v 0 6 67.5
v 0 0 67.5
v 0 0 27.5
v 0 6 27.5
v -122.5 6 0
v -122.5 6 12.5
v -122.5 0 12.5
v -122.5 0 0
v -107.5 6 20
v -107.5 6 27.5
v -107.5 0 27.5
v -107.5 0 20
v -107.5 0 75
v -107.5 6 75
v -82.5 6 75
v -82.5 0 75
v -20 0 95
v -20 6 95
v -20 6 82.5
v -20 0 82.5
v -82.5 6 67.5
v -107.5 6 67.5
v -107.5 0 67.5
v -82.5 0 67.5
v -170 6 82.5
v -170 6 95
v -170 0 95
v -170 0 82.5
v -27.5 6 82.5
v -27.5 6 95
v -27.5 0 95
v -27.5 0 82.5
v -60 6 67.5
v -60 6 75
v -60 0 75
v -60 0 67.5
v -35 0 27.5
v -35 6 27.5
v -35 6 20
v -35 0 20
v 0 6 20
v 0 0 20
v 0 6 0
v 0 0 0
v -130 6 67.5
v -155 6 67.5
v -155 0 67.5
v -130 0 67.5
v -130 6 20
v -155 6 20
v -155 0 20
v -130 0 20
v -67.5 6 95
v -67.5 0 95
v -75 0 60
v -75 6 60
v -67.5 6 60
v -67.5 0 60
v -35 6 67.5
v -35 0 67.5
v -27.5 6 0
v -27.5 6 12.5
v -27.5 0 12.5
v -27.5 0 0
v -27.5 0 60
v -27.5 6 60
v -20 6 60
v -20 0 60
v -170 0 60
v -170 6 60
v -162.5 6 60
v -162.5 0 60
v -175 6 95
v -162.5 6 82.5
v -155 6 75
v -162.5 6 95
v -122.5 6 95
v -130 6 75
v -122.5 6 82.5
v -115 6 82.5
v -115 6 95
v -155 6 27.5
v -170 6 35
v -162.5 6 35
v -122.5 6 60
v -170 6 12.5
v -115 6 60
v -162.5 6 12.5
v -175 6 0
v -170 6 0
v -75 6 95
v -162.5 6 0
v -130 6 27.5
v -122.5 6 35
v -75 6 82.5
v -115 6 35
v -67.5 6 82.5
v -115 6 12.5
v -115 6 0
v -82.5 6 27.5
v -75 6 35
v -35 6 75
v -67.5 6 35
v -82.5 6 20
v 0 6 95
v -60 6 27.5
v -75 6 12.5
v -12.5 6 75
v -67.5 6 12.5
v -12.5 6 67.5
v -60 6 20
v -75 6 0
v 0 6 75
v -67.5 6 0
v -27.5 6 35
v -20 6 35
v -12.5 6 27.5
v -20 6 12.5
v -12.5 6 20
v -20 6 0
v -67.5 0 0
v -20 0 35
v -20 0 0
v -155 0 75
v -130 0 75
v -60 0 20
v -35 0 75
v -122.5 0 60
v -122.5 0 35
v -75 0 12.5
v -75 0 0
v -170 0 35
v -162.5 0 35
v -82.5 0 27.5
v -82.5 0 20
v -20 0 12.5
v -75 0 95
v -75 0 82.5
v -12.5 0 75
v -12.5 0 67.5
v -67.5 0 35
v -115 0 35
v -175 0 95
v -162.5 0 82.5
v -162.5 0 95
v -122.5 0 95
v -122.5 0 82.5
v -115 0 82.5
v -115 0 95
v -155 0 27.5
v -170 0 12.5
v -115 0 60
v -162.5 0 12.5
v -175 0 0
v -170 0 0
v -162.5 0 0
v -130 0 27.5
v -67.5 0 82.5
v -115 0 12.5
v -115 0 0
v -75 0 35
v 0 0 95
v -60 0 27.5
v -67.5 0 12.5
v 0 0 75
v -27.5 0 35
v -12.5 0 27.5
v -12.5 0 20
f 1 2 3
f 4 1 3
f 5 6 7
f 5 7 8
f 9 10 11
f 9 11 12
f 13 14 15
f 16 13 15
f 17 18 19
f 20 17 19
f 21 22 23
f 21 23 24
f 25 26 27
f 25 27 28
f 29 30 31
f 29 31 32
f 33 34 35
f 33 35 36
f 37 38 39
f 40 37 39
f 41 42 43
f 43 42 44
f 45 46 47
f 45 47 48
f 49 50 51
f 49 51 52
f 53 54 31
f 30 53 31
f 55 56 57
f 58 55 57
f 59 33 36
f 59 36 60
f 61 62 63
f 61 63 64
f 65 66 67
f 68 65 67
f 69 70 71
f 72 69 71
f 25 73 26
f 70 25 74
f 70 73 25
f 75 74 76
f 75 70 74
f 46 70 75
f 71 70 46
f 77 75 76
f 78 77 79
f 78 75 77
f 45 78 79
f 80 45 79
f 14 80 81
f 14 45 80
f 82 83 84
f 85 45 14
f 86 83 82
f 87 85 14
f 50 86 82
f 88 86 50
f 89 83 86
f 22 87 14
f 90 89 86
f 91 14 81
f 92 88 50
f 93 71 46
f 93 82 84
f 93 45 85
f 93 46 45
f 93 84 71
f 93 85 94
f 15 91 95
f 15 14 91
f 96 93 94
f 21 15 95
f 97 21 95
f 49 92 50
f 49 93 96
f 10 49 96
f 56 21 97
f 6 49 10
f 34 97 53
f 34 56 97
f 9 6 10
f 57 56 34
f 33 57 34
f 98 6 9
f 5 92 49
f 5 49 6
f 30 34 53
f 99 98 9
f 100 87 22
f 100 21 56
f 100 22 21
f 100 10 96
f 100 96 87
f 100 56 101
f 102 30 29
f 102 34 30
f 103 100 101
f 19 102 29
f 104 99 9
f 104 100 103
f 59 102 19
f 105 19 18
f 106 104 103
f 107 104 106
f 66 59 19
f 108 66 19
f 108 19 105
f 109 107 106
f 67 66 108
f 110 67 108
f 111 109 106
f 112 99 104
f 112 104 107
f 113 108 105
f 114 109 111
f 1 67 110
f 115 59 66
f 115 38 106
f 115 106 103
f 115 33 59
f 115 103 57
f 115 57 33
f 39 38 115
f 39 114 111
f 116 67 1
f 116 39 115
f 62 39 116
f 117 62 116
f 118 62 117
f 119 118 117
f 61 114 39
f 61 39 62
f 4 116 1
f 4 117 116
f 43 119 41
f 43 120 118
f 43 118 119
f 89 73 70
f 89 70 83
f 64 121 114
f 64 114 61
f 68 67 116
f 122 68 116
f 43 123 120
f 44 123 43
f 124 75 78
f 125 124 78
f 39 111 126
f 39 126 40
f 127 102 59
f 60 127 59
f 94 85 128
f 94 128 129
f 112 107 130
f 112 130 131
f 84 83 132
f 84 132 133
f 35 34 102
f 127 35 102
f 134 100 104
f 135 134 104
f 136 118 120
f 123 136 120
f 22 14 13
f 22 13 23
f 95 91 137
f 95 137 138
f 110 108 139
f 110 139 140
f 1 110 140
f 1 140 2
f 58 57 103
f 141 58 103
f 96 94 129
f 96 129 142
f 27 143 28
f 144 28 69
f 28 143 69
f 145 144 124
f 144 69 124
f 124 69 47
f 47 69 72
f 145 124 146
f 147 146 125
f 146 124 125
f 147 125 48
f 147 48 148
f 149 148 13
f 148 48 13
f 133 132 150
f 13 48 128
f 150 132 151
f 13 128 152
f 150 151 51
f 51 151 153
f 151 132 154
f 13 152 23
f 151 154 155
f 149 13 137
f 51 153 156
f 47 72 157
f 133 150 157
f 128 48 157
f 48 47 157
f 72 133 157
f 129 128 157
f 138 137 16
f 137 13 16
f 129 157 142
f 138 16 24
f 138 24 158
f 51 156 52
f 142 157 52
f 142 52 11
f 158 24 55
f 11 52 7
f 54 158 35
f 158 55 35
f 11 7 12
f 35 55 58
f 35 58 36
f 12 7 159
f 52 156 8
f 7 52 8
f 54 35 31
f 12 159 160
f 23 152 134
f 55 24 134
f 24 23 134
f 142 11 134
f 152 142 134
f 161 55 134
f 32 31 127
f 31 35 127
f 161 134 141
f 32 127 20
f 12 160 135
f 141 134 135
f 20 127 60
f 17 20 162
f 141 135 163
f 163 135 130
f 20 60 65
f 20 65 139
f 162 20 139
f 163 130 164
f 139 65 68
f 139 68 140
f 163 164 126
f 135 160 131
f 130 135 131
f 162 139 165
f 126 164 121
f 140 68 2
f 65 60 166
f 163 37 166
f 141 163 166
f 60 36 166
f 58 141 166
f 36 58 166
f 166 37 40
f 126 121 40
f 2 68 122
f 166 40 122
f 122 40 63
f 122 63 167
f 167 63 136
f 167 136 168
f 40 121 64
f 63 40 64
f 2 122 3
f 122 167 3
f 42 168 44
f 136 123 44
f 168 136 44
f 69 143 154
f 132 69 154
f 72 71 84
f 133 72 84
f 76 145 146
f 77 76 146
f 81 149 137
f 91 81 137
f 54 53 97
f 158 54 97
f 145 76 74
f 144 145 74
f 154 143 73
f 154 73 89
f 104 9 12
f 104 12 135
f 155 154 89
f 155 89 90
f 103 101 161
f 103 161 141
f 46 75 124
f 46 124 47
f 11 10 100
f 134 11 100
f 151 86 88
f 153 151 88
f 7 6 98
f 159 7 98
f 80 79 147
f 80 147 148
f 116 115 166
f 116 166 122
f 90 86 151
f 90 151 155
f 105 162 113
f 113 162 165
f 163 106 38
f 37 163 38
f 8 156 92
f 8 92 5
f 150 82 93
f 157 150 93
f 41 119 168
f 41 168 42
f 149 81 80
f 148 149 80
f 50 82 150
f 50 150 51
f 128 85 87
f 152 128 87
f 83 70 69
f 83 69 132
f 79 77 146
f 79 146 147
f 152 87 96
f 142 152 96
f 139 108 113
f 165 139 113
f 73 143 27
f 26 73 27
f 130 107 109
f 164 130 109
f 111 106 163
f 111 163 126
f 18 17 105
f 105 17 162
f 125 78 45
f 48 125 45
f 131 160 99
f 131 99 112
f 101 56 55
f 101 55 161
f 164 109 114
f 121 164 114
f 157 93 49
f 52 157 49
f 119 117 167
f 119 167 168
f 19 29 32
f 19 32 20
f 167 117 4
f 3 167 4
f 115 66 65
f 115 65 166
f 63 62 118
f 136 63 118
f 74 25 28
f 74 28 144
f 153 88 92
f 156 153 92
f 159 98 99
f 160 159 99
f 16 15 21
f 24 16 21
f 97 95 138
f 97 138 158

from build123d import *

# Parameters (mm, degrees)
ESQUISSE1_W             = 175
ESQUISSE1_H             = 95
BOSS_EXTRU_1_DEPTH      = 6
ESQUISSE9_W             = 25
ESQUISSE9_H             = 7.5
ESQUISSE9_W_2           = 12.5
ESQUISSE9_W_3           = 7.5
ESQUISSE9_H_2           = 12.5
ESQUISSE9_H_3           = 25
ENL_V_MAT_EXTRU_1_DEPTH = 6000


with BuildPart() as part:
    # Esquisse1 → Boss.-Extru.1 (new body)
    with BuildSketch(Plane(origin=(0, 0, 0), x_dir=(1, 0, 0), z_dir=(0, 1, 0))):
        with Locations((-87.5, -47.5)):
            Rectangle(ESQUISSE1_W, ESQUISSE1_H)
    extrude(amount=BOSS_EXTRU_1_DEPTH)

    # Esquisse9 → Enlèv. mat.-Extru.1 (cut)
    with BuildSketch(Plane(origin=(0, 6, 0), x_dir=(1, 0, 0), z_dir=(0, 1, 0))):
        with Locations((-142.5, -23.75)):
            Rectangle(ESQUISSE9_W, ESQUISSE9_H)
        with Locations((-142.5, -71.25)):
            Rectangle(ESQUISSE9_W, ESQUISSE9_H)
        with Locations((-95, -71.25)):
            Rectangle(ESQUISSE9_W, ESQUISSE9_H)
        with Locations((-95, -23.75)):
            Rectangle(ESQUISSE9_W, ESQUISSE9_H)
        with Locations((-47.5, -23.75)):
            Rectangle(ESQUISSE9_W, ESQUISSE9_H)
        with Locations((-6.25, -23.75)):
            Rectangle(ESQUISSE9_W_2, ESQUISSE9_H)
        with Locations((-47.5, -71.25)):
            Rectangle(ESQUISSE9_W, ESQUISSE9_H)
        with Locations((-6.25, -71.25)):
            Rectangle(ESQUISSE9_W_2, ESQUISSE9_H)
        with Locations((-166.25, -88.75)):
            Rectangle(ESQUISSE9_W_3, ESQUISSE9_H_2)
        with Locations((-166.25, -47.5)):
            Rectangle(ESQUISSE9_W_3, ESQUISSE9_H_3)
        with Locations((-166.25, -6.25)):
            Rectangle(ESQUISSE9_W_3, ESQUISSE9_H_2)
        with Locations((-118.75, -88.75)):
            Rectangle(ESQUISSE9_W_3, ESQUISSE9_H_2)
        with Locations((-71.25, -88.75)):
            Rectangle(ESQUISSE9_W_3, ESQUISSE9_H_2)
        with Locations((-23.75, -88.75)):
            Rectangle(ESQUISSE9_W_3, ESQUISSE9_H_2)
        with Locations((-118.75, -47.5)):
            Rectangle(ESQUISSE9_W_3, ESQUISSE9_H_3)
        with Locations((-71.25, -47.5)):
            Rectangle(ESQUISSE9_W_3, ESQUISSE9_H_3)
        with Locations((-23.75, -47.5)):
            Rectangle(ESQUISSE9_W_3, ESQUISSE9_H_3)
        with Locations((-118.75, -6.25)):
            Rectangle(ESQUISSE9_W_3, ESQUISSE9_H_2)
        with Locations((-71.25, -6.25)):
            Rectangle(ESQUISSE9_W_3, ESQUISSE9_H_2)
        with Locations((-23.75, -6.25)):
            Rectangle(ESQUISSE9_W_3, ESQUISSE9_H_2)
    extrude(amount=-ENL_V_MAT_EXTRU_1_DEPTH, mode=Mode.SUBTRACT)


solid = part.part
